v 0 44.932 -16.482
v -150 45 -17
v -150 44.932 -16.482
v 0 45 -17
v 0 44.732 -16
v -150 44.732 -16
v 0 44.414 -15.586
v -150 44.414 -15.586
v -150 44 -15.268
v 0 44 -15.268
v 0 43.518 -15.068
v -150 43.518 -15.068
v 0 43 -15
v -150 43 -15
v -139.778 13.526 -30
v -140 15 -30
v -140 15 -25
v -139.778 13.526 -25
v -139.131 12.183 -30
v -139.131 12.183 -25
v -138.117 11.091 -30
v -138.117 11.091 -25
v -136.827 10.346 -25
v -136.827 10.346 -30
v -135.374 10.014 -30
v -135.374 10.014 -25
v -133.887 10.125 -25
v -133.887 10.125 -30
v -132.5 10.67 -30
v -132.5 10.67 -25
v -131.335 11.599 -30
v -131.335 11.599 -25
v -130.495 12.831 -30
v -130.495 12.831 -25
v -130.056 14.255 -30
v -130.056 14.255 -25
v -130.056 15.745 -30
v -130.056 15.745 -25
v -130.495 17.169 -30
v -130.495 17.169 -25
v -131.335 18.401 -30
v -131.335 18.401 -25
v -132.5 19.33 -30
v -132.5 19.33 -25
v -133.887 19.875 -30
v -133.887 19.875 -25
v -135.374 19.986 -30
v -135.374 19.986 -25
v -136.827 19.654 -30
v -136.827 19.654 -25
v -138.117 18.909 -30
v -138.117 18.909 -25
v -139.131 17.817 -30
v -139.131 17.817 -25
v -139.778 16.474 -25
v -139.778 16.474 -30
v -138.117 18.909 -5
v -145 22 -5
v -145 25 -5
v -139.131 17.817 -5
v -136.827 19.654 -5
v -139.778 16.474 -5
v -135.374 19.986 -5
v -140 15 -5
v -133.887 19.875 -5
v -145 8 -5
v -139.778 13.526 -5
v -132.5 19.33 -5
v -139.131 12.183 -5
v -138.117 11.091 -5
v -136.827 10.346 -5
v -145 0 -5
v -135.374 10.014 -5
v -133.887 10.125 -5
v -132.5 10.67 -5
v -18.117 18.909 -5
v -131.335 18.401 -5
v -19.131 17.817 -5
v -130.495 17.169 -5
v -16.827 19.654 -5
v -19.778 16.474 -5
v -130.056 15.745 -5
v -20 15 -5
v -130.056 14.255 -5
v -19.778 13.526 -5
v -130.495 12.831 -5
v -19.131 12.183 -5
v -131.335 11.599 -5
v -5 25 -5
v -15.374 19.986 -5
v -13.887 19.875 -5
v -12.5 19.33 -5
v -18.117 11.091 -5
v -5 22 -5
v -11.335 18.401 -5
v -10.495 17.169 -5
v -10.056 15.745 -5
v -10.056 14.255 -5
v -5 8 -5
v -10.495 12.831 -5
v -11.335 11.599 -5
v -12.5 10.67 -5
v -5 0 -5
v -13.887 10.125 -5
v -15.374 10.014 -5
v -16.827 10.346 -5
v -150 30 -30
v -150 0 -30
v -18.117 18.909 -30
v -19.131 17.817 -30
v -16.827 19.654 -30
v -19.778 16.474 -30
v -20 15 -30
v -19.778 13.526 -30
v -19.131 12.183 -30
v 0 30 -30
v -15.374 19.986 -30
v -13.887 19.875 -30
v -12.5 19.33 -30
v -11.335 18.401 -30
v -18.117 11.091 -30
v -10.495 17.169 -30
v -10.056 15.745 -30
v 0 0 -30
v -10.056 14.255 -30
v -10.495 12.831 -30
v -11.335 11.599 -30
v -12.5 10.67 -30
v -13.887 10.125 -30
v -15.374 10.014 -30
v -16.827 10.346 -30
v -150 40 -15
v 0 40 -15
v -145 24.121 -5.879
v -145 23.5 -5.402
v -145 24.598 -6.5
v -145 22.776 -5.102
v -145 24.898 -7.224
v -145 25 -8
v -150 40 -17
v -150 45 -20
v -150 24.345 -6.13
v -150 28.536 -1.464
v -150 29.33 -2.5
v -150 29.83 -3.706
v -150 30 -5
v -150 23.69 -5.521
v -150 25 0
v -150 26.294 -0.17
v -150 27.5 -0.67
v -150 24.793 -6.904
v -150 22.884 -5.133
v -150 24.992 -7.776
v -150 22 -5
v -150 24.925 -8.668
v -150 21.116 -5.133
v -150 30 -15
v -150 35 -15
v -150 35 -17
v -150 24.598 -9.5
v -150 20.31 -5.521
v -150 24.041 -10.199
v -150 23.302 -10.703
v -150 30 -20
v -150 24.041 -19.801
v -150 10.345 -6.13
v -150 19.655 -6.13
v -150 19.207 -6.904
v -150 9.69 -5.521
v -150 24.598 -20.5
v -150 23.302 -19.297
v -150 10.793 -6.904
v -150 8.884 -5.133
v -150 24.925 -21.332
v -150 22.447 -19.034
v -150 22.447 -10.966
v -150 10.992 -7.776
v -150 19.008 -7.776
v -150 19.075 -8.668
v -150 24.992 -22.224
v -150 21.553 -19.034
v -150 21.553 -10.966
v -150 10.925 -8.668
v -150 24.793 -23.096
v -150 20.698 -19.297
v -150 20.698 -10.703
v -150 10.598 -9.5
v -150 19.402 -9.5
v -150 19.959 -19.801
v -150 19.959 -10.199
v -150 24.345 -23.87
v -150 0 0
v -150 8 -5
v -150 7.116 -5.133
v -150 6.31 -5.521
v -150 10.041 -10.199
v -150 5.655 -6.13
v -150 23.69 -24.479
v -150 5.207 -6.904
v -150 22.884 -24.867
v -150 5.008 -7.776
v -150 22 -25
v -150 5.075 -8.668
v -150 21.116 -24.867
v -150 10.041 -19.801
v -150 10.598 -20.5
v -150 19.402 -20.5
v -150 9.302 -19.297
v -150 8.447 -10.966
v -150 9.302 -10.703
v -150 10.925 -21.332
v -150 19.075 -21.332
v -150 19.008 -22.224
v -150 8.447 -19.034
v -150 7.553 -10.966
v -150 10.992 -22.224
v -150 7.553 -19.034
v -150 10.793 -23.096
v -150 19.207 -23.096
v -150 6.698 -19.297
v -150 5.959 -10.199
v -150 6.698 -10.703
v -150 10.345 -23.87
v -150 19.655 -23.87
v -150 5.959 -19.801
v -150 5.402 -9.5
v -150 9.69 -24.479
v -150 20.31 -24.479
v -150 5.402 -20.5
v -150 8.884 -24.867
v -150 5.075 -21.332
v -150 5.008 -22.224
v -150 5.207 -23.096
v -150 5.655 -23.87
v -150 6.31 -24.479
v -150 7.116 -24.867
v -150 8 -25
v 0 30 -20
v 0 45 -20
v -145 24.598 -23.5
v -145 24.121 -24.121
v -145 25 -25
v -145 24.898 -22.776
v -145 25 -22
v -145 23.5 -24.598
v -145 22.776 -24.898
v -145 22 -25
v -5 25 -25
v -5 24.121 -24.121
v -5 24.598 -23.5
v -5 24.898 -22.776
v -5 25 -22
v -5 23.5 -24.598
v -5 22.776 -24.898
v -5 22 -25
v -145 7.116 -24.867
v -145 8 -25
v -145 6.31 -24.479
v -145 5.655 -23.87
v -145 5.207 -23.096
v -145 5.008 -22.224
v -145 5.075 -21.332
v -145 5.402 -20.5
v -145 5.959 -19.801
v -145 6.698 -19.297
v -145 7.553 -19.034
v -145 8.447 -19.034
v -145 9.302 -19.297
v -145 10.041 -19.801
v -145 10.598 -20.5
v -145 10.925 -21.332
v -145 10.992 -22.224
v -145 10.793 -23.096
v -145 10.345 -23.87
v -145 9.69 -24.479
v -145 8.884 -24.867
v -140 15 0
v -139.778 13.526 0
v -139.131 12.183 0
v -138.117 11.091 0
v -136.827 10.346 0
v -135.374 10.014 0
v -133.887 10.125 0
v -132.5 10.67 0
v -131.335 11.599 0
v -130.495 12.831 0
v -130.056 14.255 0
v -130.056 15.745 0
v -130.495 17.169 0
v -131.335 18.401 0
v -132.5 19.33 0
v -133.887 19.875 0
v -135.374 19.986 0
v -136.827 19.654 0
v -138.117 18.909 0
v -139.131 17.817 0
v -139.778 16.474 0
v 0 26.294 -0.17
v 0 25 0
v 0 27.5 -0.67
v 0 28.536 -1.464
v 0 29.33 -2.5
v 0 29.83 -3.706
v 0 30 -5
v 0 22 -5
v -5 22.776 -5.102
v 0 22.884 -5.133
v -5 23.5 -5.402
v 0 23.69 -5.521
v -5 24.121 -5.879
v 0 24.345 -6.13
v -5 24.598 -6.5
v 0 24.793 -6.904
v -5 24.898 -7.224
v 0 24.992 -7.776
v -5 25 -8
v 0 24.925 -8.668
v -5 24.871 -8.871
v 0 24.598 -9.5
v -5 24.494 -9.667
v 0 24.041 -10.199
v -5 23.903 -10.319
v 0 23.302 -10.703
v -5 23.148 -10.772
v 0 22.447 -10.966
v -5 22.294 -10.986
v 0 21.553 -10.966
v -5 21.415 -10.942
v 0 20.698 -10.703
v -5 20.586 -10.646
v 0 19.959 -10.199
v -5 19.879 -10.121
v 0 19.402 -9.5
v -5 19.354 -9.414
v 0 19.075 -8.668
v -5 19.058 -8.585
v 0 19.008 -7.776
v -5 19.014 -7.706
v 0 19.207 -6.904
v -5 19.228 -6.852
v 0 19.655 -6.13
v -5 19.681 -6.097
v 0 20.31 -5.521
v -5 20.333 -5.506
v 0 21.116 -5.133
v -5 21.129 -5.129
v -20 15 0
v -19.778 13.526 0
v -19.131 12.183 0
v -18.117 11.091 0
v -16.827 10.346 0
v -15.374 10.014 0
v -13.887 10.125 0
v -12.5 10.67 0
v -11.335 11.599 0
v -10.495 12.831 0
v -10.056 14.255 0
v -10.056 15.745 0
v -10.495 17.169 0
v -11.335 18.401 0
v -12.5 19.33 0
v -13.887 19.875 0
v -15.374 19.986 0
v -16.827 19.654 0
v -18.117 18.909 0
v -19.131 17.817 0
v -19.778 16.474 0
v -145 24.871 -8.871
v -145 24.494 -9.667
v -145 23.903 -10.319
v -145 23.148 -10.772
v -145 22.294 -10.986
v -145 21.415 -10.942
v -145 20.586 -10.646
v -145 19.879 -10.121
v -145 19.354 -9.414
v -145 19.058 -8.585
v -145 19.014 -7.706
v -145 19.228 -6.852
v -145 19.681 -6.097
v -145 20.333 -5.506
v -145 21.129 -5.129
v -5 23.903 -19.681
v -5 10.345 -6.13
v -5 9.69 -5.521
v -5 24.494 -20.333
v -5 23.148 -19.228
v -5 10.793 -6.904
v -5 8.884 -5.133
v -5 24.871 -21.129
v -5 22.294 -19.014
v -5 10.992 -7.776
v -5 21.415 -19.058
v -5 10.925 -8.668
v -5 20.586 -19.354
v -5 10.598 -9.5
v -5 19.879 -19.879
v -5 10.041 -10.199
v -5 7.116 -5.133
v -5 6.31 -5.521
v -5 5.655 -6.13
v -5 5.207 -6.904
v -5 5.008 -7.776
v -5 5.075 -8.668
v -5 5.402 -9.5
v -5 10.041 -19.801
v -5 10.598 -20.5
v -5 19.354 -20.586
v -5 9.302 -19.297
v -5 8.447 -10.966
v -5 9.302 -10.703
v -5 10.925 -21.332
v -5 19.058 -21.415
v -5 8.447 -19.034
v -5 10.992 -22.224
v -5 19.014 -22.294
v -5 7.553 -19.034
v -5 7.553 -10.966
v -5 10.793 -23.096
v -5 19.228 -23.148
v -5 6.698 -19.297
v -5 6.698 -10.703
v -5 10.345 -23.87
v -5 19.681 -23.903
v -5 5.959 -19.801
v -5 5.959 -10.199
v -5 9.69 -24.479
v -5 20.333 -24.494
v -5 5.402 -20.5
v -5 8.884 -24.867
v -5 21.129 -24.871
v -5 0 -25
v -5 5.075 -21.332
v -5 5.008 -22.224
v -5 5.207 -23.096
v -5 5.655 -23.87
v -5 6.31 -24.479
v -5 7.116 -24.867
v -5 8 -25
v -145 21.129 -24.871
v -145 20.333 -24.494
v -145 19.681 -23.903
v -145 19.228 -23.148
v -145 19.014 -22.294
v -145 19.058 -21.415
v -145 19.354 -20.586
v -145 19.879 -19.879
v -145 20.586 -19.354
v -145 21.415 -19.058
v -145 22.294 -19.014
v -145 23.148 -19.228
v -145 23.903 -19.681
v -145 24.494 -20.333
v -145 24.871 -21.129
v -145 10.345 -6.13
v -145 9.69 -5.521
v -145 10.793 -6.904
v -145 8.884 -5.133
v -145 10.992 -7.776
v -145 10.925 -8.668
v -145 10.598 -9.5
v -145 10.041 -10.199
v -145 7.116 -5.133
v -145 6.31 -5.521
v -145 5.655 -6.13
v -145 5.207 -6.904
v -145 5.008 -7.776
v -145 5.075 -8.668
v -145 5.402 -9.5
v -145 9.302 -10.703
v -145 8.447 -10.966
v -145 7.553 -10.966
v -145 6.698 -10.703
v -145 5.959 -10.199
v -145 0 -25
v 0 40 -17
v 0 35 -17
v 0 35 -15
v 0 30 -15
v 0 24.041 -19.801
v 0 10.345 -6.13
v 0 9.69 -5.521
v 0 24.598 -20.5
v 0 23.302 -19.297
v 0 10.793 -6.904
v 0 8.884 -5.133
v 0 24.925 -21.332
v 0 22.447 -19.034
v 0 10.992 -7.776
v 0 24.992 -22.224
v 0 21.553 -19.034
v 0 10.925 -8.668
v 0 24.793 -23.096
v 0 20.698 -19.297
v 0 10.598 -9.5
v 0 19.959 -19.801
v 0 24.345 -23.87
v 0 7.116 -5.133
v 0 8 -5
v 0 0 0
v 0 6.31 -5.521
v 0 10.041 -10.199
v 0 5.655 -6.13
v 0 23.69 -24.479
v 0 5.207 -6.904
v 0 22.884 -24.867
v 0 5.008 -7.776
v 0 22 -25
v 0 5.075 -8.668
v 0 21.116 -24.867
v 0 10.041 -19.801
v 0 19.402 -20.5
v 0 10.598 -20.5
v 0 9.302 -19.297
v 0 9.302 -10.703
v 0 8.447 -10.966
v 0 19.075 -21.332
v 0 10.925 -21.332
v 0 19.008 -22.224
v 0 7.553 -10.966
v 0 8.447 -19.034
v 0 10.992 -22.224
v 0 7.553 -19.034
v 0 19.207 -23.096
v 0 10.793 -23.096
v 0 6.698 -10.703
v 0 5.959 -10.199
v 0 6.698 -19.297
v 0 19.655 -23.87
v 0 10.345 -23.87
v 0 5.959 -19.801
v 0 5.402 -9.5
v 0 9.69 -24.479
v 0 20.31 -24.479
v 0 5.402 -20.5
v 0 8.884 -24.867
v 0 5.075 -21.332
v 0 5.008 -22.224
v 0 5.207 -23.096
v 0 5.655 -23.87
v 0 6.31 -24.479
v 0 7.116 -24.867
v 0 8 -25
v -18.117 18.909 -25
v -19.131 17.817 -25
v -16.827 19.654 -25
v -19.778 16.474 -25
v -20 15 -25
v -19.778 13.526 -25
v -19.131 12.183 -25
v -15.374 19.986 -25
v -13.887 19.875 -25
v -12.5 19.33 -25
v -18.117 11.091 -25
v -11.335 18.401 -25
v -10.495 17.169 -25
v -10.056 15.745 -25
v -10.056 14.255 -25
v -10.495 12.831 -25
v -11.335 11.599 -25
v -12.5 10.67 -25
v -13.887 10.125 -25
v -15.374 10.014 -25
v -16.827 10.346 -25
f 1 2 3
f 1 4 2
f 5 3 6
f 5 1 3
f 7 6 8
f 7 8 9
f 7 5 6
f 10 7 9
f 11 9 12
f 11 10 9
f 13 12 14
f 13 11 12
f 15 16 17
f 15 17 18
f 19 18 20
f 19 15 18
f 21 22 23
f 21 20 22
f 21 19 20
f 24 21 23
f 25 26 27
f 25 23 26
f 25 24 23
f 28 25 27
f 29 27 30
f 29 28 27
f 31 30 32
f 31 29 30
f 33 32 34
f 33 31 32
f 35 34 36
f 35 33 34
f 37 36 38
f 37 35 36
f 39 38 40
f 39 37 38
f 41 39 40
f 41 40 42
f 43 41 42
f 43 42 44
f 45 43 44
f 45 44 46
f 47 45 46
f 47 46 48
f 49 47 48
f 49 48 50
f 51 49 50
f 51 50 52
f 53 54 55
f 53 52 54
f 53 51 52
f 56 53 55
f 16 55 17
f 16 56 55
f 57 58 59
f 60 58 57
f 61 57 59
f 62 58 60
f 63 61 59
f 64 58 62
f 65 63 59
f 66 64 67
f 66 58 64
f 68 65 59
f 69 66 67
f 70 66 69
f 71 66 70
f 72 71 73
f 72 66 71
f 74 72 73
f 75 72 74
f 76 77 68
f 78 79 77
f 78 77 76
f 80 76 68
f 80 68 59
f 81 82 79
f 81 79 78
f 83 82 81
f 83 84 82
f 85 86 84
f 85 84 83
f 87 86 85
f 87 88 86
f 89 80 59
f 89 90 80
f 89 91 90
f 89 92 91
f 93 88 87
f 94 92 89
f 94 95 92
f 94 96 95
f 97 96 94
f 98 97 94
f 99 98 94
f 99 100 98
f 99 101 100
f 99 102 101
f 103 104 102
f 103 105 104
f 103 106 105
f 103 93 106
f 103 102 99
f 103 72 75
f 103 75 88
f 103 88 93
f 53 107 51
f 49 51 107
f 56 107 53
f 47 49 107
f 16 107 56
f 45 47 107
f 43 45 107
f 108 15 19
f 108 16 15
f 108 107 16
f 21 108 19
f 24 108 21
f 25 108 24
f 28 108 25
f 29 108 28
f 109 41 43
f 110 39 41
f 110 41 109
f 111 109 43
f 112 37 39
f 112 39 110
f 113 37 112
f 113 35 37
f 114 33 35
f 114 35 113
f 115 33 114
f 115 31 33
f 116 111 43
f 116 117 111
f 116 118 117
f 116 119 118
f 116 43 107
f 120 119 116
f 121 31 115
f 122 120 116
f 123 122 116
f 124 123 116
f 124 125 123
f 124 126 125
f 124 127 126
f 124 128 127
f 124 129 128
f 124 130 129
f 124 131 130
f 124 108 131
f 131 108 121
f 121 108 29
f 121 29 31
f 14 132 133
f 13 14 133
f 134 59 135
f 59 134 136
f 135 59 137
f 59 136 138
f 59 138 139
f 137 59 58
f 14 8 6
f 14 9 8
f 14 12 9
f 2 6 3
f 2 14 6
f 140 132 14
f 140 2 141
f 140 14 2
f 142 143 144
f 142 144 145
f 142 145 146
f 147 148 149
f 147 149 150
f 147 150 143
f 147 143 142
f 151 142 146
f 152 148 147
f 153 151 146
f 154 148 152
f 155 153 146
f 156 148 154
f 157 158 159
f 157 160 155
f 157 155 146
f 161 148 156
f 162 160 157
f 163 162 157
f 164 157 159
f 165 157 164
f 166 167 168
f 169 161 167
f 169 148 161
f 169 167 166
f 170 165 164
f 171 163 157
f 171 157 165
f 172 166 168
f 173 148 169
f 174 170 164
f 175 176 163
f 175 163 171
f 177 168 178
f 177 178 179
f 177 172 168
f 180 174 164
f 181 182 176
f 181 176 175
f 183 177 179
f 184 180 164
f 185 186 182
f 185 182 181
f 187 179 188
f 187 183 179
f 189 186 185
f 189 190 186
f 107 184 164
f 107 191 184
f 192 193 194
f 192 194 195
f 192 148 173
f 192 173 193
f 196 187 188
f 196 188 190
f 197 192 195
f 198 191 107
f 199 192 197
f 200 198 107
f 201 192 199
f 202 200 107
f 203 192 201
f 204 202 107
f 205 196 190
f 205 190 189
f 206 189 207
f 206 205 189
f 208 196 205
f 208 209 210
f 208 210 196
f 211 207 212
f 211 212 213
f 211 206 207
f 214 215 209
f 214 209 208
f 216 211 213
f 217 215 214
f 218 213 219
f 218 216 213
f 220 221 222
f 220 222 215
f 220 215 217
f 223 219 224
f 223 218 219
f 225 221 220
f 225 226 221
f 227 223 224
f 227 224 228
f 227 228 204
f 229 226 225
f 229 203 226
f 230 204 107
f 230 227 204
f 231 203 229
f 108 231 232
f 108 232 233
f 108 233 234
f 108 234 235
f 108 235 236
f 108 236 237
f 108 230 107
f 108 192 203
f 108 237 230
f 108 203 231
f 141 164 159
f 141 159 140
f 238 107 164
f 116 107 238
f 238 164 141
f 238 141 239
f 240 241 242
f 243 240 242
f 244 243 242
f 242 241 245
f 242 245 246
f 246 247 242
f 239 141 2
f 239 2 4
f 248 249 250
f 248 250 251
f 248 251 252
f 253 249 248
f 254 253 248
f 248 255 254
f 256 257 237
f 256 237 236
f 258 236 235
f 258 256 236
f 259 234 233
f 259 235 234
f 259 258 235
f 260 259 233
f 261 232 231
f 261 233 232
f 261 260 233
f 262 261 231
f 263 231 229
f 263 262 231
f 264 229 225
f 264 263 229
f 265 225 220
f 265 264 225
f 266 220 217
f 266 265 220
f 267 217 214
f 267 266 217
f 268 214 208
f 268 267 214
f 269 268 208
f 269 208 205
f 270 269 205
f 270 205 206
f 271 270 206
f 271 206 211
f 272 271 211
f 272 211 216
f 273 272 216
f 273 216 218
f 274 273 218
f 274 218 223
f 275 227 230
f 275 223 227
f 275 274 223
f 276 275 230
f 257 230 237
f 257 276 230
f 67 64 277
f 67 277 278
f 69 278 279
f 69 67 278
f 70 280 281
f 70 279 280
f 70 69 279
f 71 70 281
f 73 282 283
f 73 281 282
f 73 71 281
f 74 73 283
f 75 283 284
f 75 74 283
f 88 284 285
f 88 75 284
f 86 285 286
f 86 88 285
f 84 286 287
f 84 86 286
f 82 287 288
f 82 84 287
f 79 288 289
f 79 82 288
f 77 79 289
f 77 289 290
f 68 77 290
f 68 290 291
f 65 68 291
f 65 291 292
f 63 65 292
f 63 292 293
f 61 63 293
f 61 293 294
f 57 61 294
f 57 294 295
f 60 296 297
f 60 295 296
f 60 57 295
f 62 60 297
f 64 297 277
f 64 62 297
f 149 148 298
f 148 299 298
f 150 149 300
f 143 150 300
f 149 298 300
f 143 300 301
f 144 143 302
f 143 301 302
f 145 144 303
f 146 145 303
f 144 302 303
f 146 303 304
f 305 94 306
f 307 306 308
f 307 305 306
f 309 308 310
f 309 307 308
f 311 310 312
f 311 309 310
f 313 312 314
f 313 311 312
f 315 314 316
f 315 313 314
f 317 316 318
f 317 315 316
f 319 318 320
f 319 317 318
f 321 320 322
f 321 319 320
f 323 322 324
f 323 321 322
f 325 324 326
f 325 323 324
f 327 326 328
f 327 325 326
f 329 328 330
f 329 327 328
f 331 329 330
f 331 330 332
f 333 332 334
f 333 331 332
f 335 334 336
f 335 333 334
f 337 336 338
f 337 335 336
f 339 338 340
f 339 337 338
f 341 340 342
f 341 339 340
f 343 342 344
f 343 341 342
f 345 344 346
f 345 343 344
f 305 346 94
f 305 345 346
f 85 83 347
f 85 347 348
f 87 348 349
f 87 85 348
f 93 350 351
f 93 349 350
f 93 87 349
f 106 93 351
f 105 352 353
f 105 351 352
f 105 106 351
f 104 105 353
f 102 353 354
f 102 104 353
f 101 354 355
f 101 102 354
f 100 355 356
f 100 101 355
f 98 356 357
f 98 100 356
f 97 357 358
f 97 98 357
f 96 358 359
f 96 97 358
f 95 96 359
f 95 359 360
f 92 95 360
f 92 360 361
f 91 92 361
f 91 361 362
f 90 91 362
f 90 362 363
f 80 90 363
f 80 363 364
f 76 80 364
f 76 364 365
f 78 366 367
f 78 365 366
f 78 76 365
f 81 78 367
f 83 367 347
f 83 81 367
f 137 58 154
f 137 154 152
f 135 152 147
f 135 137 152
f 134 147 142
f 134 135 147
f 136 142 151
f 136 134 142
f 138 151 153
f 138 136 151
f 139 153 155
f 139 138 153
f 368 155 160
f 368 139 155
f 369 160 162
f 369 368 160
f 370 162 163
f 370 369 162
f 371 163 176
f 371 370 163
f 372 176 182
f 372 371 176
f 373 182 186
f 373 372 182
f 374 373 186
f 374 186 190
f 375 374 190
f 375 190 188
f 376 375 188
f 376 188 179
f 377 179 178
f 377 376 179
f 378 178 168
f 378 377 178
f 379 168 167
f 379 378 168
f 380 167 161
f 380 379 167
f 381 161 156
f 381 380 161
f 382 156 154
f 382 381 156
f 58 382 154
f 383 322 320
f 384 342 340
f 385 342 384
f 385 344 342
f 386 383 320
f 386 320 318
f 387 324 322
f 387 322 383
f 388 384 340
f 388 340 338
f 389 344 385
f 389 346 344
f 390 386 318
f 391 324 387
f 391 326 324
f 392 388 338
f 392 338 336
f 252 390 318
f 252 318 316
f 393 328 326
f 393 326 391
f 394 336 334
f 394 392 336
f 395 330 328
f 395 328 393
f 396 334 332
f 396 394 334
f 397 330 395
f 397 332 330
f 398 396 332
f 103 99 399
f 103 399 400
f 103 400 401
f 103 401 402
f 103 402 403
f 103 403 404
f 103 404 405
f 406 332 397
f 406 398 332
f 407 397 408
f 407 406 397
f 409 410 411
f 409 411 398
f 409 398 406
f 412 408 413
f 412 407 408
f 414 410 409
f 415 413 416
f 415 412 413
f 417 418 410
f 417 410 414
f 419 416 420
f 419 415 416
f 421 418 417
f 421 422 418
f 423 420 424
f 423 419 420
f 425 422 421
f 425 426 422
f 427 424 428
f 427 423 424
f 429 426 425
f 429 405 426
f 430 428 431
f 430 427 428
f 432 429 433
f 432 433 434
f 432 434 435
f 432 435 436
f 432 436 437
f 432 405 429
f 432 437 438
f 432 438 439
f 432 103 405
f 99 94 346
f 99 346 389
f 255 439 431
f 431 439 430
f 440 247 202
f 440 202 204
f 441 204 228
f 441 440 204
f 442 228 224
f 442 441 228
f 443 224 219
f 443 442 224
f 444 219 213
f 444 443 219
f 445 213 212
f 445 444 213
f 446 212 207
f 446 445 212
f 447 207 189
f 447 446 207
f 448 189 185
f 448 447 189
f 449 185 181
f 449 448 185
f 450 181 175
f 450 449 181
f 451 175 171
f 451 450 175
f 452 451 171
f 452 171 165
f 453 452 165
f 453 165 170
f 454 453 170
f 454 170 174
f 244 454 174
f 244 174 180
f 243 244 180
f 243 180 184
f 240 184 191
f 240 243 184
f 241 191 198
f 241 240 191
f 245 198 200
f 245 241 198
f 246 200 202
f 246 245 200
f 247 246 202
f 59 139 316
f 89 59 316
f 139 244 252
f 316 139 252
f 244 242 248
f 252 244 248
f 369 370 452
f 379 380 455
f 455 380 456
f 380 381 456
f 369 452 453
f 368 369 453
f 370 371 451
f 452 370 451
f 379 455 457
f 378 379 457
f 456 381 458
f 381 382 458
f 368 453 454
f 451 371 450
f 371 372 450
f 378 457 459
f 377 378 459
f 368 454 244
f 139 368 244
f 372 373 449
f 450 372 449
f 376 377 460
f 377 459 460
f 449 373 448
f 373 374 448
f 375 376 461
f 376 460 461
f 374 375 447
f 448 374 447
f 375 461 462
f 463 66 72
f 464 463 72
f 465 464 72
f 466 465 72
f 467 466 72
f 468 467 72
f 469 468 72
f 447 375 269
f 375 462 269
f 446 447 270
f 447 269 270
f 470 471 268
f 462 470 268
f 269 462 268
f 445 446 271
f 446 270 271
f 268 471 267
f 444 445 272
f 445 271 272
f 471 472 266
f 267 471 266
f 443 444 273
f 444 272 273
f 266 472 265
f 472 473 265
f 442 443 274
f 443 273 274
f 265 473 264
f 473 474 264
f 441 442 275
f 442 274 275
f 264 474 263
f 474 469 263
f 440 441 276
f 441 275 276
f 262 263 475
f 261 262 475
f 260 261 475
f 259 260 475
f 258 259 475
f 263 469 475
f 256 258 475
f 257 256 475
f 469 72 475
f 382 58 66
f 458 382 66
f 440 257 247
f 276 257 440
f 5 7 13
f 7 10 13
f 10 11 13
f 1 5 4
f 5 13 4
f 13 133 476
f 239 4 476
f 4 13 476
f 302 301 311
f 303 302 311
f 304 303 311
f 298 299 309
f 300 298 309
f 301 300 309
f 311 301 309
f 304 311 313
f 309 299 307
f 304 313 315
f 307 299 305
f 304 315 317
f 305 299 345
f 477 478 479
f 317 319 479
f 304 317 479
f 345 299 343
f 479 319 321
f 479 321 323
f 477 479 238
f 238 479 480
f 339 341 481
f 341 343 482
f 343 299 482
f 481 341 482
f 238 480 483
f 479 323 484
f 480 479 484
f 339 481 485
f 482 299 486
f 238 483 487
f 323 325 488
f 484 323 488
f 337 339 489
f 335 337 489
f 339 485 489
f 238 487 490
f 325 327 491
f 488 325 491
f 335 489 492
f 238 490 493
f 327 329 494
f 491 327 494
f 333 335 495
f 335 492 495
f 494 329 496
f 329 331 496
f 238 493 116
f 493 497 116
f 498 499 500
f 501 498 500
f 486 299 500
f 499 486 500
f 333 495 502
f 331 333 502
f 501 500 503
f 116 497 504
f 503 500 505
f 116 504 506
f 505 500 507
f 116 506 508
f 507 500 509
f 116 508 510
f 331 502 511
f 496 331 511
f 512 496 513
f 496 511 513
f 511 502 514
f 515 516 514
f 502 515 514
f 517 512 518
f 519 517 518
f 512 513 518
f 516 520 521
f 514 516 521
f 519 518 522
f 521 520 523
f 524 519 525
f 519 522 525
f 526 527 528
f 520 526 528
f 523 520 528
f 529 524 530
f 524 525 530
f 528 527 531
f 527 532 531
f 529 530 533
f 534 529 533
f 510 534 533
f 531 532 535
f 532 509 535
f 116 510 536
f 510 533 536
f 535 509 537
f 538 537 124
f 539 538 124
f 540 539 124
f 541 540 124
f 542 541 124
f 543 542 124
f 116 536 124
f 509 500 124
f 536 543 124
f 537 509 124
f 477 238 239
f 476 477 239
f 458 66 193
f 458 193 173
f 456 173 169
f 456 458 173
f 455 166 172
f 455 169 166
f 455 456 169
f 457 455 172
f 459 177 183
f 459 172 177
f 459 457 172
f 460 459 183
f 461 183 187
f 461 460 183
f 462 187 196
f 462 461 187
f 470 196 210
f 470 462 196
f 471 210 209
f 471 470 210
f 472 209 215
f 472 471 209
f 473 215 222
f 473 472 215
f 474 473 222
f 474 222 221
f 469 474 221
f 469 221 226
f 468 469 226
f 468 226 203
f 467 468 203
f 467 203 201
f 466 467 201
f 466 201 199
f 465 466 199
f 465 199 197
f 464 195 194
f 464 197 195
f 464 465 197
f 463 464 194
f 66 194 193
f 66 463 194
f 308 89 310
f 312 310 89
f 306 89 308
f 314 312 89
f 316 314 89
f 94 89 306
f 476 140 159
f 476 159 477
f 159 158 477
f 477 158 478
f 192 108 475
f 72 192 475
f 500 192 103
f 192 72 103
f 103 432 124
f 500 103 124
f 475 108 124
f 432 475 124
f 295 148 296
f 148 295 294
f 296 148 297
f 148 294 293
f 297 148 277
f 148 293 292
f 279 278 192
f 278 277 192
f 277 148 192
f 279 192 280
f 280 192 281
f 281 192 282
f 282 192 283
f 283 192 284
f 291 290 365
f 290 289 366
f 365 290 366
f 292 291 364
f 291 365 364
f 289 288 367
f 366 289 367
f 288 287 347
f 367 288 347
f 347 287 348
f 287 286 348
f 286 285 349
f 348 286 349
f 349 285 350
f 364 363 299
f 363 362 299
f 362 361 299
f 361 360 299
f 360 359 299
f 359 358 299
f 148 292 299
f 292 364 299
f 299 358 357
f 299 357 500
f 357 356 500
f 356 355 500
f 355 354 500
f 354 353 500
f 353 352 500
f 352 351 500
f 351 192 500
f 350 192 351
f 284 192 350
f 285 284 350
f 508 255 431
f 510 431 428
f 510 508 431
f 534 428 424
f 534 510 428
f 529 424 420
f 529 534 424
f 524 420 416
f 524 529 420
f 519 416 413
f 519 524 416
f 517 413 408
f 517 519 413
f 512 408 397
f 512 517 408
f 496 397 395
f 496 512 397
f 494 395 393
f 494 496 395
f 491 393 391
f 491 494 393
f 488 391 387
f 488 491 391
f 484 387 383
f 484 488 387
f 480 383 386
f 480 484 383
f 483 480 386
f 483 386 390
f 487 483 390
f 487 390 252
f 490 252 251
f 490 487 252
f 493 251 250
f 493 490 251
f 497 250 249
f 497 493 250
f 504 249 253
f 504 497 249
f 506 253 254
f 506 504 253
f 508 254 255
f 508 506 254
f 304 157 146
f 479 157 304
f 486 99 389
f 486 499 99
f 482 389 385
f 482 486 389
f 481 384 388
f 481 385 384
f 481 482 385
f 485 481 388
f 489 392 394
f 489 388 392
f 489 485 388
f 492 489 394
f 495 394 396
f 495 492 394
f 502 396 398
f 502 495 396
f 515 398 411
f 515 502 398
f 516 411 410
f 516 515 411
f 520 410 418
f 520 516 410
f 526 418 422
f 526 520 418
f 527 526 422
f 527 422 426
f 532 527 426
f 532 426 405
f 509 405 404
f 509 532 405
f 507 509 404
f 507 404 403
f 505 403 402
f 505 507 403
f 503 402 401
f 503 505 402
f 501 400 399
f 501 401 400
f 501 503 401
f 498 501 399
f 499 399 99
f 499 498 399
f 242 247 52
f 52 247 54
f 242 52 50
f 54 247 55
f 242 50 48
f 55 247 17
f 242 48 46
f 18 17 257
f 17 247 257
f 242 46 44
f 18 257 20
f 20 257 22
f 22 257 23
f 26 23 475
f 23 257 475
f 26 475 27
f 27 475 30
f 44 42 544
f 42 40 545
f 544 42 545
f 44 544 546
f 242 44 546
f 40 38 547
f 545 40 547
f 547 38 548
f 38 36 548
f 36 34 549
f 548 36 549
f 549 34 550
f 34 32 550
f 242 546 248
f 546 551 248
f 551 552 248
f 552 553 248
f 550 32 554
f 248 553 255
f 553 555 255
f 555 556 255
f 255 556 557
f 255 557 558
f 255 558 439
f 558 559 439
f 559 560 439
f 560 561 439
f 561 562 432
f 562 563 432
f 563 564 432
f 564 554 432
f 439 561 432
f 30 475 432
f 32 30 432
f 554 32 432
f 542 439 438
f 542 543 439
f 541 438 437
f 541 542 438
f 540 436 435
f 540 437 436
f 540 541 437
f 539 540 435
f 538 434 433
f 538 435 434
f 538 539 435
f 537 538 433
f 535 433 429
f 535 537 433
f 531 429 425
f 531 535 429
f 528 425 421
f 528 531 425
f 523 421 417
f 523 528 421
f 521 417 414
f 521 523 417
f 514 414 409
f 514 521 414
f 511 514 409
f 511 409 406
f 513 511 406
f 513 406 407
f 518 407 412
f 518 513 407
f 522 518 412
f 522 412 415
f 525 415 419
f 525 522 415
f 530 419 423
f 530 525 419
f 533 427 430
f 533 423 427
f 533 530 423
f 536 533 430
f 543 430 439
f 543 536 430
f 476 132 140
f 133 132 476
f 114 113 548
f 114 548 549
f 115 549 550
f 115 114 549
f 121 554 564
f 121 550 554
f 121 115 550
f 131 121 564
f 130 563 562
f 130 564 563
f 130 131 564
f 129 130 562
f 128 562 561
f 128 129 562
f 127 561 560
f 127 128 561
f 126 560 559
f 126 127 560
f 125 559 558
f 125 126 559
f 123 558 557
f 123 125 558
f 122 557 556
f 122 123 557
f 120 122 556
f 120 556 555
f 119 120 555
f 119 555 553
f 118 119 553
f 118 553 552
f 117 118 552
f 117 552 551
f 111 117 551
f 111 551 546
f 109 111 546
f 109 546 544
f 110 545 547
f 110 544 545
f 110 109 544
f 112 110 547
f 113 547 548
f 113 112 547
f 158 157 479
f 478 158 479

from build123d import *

# Parameters (mm, degrees)
SKETCH2_W               = 150
SKETCH2_H               = 30
BOSS_EXTRUDE1_DEPTH     = 30
SHELL1_T                = -5
CUT_EXTRUDE1_DEPTH      = 156.884572681
CUT_EXTRUDE1_DEPTH_BACK = 156.884572681
SKETCH3_R               = 3
CUT_EXTRUDE2_DEPTH      = 156.884572681
CUT_EXTRUDE2_DEPTH_BACK = 156.884572681
SKETCH5_R               = 5
SKETCH6_W               = 150
SKETCH6_H               = 5
BOSS_EXTRUDE3_DEPTH     = 15
SKETCH7_W               = 150
SKETCH7_H               = 5
CUT_EXTRUDE3_DEPTH      = 2
FILLET1_R               = 2
FILLET2_R               = 5


with BuildPart() as part:
    # Sketch2 → Boss-Extrude1 (new body)
    with BuildSketch(Plane(origin=(0, 0, 0), x_dir=(1, 0, 0), z_dir=(0, 1, 0))):
        with Locations((-75, 15)):
            Rectangle(SKETCH2_W, SKETCH2_H)
    extrude(amount=BOSS_EXTRUDE1_DEPTH)

    # Shell1
    shell1_openings = [part.faces().sort_by_distance(p)[0] for p in [
        (-75, 0, -15),
    ]]
    offset(amount=SHELL1_T, openings=shell1_openings, kind=Kind.INTERSECTION)

    # Sketch3 → Cut-Extrude1 (cut, two sides: drawn at the far end of the back side and taken through both)
    with BuildSketch(Plane.ZY.offset(150).offset(-CUT_EXTRUDE1_DEPTH_BACK)):
        with Locations(Location((-22, 22, 0), (0, 0, 180))):
            Circle(SKETCH3_R)
        with Locations((-8, 22)):
            Circle(SKETCH3_R)
        with Locations((-8, 8)):
            Circle(SKETCH3_R)
        with Locations(Location((-22, 8, 0), (0, 0, 180))):
            Circle(SKETCH3_R)
    extrude(amount=CUT_EXTRUDE1_DEPTH + CUT_EXTRUDE1_DEPTH_BACK, mode=Mode.SUBTRACT)

    # Sketch5 → Cut-Extrude2 (cut, two sides: drawn at the far end of the back side and taken through both)
    with BuildSketch(Plane.XY.offset(-CUT_EXTRUDE2_DEPTH_BACK)):
        with Locations(Location((-135, 15, 0), (0, 0, 180))):
            Circle(SKETCH5_R)
        with Locations(Location((-15, 15, 0), (0, 0, 180))):
            Circle(SKETCH5_R)
    extrude(amount=CUT_EXTRUDE2_DEPTH + CUT_EXTRUDE2_DEPTH_BACK, mode=Mode.SUBTRACT)

    # Sketch6 → Boss-Extrude3 (add)
    with BuildSketch(Plane(origin=(0, 30, 0), x_dir=(1, 0, 0), z_dir=(0, 1, 0))):
        with Locations((-75, 17.5)):
            Rectangle(SKETCH6_W, SKETCH6_H)
    extrude(amount=BOSS_EXTRUDE3_DEPTH)

    # Sketch7 → Cut-Extrude3 (cut)
    with BuildSketch(Plane.XY.offset(-15)):
        with Locations((-75, 37.5)):
            Rectangle(SKETCH7_W, SKETCH7_H)
    extrude(amount=-CUT_EXTRUDE3_DEPTH, mode=Mode.SUBTRACT)

    # Fillet1
    fillet1_edges = [part.edges().sort_by_distance(p)[0] for p in [
        (-75, 45, -15),
    ]]
    fillet(fillet1_edges, radius=FILLET1_R)

    # Fillet2
    fillet2_edges = [part.edges().sort_by_distance(p)[0] for p in [
        (-75, 30, 0),
    ]]
    fillet(fillet2_edges, radius=FILLET2_R)


solid = part.part
